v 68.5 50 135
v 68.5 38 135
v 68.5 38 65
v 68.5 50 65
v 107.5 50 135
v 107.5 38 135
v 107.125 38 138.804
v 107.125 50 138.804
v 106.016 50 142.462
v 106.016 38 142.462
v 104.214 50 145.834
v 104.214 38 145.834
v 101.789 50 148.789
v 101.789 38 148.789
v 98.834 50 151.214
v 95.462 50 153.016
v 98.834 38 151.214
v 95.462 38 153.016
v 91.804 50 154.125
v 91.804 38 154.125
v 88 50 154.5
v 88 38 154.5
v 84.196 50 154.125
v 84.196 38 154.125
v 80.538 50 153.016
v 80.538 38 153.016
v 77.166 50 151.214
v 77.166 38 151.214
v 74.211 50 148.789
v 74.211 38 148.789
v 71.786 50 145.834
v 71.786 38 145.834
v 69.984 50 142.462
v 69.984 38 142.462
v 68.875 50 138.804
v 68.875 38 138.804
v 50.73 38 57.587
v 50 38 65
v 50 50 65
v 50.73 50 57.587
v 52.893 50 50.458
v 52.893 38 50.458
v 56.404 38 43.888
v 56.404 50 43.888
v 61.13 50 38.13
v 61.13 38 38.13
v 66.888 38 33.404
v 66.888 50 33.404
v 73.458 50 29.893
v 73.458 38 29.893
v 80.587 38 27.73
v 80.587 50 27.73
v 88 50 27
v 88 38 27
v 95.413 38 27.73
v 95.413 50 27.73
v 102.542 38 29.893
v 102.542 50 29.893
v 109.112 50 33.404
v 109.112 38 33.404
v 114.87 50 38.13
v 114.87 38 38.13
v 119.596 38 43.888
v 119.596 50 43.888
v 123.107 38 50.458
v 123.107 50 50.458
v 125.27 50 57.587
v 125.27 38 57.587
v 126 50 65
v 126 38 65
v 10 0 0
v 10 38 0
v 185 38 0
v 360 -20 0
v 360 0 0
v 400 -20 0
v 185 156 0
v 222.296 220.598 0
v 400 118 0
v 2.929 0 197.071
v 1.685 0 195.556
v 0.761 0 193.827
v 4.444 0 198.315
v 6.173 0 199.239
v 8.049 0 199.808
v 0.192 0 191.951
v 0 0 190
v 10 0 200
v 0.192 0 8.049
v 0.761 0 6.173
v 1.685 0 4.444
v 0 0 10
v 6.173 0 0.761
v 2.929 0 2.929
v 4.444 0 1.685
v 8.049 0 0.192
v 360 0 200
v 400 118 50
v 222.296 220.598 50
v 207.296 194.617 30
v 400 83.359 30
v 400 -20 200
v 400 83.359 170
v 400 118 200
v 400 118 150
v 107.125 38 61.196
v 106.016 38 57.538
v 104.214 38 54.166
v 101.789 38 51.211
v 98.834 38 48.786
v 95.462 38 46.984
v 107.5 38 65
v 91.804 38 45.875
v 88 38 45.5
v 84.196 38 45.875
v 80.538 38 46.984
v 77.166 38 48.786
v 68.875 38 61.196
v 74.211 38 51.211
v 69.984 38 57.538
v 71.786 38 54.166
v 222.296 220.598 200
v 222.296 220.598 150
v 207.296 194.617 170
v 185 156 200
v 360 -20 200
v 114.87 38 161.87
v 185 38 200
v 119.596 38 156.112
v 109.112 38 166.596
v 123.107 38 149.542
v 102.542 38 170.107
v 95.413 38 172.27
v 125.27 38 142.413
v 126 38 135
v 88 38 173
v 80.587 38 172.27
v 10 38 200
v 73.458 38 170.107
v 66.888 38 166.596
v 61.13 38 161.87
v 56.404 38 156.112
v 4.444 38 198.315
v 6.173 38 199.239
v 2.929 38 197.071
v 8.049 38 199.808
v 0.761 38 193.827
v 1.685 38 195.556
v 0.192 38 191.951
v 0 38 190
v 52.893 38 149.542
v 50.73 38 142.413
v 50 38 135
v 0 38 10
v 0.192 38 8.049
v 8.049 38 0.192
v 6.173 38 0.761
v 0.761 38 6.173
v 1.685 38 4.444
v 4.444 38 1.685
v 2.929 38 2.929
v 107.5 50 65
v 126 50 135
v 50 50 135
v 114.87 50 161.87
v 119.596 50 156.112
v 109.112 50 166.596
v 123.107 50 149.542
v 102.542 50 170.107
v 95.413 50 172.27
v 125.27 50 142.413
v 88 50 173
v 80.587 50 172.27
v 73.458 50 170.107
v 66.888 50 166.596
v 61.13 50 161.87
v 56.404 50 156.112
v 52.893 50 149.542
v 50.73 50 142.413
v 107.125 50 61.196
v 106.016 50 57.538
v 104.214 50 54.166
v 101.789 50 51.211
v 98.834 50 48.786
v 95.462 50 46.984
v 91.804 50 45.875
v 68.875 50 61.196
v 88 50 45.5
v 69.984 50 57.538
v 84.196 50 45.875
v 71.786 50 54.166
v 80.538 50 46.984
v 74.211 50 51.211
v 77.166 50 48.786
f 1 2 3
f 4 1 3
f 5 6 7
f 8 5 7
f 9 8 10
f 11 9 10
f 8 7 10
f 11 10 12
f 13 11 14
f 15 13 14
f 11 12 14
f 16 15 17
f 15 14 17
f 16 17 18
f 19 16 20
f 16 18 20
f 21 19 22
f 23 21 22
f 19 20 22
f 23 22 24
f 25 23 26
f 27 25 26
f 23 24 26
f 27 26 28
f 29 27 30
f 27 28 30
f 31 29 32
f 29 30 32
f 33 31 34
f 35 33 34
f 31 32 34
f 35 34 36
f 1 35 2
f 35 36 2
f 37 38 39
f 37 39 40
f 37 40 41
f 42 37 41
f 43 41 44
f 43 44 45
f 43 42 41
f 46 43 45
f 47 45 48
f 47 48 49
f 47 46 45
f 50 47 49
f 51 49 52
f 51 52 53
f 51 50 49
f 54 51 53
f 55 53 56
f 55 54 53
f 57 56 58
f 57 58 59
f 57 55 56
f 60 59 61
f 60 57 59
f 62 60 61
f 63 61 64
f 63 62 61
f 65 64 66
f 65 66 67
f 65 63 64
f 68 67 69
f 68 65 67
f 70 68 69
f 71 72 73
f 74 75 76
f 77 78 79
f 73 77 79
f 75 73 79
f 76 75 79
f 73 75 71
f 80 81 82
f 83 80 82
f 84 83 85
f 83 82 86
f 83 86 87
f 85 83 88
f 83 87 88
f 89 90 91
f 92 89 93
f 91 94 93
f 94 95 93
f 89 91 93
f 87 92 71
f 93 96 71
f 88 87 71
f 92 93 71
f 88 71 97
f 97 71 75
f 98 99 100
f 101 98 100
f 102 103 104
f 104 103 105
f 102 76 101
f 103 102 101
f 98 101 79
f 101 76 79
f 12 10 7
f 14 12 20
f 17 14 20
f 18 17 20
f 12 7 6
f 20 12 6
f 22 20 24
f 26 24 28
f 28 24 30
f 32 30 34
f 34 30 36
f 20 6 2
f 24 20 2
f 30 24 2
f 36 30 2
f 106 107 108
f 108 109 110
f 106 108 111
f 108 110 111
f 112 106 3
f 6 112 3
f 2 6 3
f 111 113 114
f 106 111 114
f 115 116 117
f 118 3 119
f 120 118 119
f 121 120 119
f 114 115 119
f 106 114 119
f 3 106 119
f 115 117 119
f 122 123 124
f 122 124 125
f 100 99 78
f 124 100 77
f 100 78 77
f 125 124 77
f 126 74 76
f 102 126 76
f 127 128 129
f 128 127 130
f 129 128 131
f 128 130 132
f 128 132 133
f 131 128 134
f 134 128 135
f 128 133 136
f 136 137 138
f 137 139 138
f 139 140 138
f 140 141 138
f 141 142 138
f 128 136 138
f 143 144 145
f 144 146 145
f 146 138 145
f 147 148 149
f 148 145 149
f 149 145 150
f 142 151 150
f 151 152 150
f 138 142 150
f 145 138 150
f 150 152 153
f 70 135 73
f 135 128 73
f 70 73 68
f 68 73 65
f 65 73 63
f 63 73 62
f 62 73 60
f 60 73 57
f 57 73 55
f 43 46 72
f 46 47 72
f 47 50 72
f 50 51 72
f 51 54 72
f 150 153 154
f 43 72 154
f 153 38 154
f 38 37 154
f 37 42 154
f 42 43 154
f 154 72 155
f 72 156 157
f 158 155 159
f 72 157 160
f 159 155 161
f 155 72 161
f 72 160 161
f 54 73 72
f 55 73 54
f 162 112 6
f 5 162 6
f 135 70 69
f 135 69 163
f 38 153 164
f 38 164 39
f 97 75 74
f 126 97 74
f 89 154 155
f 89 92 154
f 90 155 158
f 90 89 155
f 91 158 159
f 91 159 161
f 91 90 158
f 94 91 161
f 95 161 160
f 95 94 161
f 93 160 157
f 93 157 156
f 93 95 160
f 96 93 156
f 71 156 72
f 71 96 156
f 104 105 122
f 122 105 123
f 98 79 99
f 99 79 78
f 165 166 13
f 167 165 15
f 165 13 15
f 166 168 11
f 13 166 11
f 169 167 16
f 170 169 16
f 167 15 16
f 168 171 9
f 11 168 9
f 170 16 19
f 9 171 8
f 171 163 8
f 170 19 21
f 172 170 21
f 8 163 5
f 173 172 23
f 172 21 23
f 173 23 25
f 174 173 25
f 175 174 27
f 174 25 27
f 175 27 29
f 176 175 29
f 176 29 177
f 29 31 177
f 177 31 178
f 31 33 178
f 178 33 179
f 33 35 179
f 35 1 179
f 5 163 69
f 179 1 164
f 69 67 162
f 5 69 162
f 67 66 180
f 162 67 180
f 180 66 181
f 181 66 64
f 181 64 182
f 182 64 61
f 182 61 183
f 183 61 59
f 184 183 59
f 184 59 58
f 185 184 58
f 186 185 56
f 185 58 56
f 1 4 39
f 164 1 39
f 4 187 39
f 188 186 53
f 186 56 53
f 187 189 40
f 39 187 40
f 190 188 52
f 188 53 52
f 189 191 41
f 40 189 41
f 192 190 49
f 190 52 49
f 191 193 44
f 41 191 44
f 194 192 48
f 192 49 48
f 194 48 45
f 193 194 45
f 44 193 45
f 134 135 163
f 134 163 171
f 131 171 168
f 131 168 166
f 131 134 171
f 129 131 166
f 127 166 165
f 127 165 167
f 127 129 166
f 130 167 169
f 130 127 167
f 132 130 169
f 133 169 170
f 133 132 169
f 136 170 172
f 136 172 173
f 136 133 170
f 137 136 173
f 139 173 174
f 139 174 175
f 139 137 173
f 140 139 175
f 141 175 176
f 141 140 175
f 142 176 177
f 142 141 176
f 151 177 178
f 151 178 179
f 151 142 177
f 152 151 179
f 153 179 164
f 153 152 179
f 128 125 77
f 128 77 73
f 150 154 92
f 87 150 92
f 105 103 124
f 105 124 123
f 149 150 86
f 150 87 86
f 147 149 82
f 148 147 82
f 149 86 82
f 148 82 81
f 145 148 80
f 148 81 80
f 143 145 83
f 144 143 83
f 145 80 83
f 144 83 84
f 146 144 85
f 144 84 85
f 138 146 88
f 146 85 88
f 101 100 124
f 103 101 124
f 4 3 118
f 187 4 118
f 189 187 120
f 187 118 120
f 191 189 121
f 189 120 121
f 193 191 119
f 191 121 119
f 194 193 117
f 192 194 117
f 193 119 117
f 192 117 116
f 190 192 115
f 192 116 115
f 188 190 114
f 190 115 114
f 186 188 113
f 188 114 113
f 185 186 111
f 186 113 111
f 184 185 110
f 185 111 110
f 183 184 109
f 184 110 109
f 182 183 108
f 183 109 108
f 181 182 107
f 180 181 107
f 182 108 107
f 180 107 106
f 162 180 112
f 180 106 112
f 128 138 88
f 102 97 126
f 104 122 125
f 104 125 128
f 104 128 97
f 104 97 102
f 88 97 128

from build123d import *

# Parameters (mm, degrees)
BOSS_EXTRUDE1_DEPTH = 200
CUT_EXTRUDE1_DEPTH  = 466.401952215
FILLET1_R           = 10
BOSS_EXTRUDE2_DEPTH = 12


with BuildPart() as part:
    # Sketch1 → Boss-Extrude1 (new body)
    with BuildSketch(Plane.XY):
        Polygon((0, 0), (360, 0), (360, -20), (400, -20), (400, 118), (222.295517328, 220.597730907), (185, 156), (185, 38), (0, 38), align=None)
    extrude(amount=BOSS_EXTRUDE1_DEPTH)

    # Sketch2 → Cut-Extrude1 (cut, through all)
    with BuildSketch(Plane(origin=(71.200018505, -41.10734985, 0), x_dir=(0, 0, 1), z_dir=(-0.8660254037844399, 0.4999999999999977, 0))):
        Polygon((30, 272.190997647), (170, 272.190997647), (150, 302.190997647), (50, 302.190997647), align=None)
    extrude(amount=-CUT_EXTRUDE1_DEPTH, mode=Mode.SUBTRACT)

    # Fillet1
    fillet1_edges = [part.edges().sort_by_distance(p)[0] for p in [
        (0, 19, 0),
        (0, 19, 200),
    ]]
    fillet(fillet1_edges, radius=FILLET1_R)

    # Sketch3 → Boss-Extrude2 (add)
    with BuildSketch(Plane(origin=(0, 38, 0), x_dir=(1, 0, 0), z_dir=(0, 1, 0))):
        with BuildLine():
            Line((50, -135), (50, -65))
            ThreePointArc((50, -65), (87.999995632, -26.999991264), (126, -64.999991264))
            Line((126, -64.999991264), (126, -135))
            ThreePointArc((126, -135), (88, -173), (50, -135))
        make_face()
        with BuildLine():
            Line((68.5, -135), (68.5, -65))
            ThreePointArc((68.5, -65), (87.999995632, -45.499991264), (107.5, -64.999991264))
            Line((107.5, -64.999991264), (107.5, -135))
            ThreePointArc((107.5, -135), (88, -154.5), (68.5, -135))
        make_face(mode=Mode.SUBTRACT)
    extrude(amount=BOSS_EXTRUDE2_DEPTH)


solid = part.part
